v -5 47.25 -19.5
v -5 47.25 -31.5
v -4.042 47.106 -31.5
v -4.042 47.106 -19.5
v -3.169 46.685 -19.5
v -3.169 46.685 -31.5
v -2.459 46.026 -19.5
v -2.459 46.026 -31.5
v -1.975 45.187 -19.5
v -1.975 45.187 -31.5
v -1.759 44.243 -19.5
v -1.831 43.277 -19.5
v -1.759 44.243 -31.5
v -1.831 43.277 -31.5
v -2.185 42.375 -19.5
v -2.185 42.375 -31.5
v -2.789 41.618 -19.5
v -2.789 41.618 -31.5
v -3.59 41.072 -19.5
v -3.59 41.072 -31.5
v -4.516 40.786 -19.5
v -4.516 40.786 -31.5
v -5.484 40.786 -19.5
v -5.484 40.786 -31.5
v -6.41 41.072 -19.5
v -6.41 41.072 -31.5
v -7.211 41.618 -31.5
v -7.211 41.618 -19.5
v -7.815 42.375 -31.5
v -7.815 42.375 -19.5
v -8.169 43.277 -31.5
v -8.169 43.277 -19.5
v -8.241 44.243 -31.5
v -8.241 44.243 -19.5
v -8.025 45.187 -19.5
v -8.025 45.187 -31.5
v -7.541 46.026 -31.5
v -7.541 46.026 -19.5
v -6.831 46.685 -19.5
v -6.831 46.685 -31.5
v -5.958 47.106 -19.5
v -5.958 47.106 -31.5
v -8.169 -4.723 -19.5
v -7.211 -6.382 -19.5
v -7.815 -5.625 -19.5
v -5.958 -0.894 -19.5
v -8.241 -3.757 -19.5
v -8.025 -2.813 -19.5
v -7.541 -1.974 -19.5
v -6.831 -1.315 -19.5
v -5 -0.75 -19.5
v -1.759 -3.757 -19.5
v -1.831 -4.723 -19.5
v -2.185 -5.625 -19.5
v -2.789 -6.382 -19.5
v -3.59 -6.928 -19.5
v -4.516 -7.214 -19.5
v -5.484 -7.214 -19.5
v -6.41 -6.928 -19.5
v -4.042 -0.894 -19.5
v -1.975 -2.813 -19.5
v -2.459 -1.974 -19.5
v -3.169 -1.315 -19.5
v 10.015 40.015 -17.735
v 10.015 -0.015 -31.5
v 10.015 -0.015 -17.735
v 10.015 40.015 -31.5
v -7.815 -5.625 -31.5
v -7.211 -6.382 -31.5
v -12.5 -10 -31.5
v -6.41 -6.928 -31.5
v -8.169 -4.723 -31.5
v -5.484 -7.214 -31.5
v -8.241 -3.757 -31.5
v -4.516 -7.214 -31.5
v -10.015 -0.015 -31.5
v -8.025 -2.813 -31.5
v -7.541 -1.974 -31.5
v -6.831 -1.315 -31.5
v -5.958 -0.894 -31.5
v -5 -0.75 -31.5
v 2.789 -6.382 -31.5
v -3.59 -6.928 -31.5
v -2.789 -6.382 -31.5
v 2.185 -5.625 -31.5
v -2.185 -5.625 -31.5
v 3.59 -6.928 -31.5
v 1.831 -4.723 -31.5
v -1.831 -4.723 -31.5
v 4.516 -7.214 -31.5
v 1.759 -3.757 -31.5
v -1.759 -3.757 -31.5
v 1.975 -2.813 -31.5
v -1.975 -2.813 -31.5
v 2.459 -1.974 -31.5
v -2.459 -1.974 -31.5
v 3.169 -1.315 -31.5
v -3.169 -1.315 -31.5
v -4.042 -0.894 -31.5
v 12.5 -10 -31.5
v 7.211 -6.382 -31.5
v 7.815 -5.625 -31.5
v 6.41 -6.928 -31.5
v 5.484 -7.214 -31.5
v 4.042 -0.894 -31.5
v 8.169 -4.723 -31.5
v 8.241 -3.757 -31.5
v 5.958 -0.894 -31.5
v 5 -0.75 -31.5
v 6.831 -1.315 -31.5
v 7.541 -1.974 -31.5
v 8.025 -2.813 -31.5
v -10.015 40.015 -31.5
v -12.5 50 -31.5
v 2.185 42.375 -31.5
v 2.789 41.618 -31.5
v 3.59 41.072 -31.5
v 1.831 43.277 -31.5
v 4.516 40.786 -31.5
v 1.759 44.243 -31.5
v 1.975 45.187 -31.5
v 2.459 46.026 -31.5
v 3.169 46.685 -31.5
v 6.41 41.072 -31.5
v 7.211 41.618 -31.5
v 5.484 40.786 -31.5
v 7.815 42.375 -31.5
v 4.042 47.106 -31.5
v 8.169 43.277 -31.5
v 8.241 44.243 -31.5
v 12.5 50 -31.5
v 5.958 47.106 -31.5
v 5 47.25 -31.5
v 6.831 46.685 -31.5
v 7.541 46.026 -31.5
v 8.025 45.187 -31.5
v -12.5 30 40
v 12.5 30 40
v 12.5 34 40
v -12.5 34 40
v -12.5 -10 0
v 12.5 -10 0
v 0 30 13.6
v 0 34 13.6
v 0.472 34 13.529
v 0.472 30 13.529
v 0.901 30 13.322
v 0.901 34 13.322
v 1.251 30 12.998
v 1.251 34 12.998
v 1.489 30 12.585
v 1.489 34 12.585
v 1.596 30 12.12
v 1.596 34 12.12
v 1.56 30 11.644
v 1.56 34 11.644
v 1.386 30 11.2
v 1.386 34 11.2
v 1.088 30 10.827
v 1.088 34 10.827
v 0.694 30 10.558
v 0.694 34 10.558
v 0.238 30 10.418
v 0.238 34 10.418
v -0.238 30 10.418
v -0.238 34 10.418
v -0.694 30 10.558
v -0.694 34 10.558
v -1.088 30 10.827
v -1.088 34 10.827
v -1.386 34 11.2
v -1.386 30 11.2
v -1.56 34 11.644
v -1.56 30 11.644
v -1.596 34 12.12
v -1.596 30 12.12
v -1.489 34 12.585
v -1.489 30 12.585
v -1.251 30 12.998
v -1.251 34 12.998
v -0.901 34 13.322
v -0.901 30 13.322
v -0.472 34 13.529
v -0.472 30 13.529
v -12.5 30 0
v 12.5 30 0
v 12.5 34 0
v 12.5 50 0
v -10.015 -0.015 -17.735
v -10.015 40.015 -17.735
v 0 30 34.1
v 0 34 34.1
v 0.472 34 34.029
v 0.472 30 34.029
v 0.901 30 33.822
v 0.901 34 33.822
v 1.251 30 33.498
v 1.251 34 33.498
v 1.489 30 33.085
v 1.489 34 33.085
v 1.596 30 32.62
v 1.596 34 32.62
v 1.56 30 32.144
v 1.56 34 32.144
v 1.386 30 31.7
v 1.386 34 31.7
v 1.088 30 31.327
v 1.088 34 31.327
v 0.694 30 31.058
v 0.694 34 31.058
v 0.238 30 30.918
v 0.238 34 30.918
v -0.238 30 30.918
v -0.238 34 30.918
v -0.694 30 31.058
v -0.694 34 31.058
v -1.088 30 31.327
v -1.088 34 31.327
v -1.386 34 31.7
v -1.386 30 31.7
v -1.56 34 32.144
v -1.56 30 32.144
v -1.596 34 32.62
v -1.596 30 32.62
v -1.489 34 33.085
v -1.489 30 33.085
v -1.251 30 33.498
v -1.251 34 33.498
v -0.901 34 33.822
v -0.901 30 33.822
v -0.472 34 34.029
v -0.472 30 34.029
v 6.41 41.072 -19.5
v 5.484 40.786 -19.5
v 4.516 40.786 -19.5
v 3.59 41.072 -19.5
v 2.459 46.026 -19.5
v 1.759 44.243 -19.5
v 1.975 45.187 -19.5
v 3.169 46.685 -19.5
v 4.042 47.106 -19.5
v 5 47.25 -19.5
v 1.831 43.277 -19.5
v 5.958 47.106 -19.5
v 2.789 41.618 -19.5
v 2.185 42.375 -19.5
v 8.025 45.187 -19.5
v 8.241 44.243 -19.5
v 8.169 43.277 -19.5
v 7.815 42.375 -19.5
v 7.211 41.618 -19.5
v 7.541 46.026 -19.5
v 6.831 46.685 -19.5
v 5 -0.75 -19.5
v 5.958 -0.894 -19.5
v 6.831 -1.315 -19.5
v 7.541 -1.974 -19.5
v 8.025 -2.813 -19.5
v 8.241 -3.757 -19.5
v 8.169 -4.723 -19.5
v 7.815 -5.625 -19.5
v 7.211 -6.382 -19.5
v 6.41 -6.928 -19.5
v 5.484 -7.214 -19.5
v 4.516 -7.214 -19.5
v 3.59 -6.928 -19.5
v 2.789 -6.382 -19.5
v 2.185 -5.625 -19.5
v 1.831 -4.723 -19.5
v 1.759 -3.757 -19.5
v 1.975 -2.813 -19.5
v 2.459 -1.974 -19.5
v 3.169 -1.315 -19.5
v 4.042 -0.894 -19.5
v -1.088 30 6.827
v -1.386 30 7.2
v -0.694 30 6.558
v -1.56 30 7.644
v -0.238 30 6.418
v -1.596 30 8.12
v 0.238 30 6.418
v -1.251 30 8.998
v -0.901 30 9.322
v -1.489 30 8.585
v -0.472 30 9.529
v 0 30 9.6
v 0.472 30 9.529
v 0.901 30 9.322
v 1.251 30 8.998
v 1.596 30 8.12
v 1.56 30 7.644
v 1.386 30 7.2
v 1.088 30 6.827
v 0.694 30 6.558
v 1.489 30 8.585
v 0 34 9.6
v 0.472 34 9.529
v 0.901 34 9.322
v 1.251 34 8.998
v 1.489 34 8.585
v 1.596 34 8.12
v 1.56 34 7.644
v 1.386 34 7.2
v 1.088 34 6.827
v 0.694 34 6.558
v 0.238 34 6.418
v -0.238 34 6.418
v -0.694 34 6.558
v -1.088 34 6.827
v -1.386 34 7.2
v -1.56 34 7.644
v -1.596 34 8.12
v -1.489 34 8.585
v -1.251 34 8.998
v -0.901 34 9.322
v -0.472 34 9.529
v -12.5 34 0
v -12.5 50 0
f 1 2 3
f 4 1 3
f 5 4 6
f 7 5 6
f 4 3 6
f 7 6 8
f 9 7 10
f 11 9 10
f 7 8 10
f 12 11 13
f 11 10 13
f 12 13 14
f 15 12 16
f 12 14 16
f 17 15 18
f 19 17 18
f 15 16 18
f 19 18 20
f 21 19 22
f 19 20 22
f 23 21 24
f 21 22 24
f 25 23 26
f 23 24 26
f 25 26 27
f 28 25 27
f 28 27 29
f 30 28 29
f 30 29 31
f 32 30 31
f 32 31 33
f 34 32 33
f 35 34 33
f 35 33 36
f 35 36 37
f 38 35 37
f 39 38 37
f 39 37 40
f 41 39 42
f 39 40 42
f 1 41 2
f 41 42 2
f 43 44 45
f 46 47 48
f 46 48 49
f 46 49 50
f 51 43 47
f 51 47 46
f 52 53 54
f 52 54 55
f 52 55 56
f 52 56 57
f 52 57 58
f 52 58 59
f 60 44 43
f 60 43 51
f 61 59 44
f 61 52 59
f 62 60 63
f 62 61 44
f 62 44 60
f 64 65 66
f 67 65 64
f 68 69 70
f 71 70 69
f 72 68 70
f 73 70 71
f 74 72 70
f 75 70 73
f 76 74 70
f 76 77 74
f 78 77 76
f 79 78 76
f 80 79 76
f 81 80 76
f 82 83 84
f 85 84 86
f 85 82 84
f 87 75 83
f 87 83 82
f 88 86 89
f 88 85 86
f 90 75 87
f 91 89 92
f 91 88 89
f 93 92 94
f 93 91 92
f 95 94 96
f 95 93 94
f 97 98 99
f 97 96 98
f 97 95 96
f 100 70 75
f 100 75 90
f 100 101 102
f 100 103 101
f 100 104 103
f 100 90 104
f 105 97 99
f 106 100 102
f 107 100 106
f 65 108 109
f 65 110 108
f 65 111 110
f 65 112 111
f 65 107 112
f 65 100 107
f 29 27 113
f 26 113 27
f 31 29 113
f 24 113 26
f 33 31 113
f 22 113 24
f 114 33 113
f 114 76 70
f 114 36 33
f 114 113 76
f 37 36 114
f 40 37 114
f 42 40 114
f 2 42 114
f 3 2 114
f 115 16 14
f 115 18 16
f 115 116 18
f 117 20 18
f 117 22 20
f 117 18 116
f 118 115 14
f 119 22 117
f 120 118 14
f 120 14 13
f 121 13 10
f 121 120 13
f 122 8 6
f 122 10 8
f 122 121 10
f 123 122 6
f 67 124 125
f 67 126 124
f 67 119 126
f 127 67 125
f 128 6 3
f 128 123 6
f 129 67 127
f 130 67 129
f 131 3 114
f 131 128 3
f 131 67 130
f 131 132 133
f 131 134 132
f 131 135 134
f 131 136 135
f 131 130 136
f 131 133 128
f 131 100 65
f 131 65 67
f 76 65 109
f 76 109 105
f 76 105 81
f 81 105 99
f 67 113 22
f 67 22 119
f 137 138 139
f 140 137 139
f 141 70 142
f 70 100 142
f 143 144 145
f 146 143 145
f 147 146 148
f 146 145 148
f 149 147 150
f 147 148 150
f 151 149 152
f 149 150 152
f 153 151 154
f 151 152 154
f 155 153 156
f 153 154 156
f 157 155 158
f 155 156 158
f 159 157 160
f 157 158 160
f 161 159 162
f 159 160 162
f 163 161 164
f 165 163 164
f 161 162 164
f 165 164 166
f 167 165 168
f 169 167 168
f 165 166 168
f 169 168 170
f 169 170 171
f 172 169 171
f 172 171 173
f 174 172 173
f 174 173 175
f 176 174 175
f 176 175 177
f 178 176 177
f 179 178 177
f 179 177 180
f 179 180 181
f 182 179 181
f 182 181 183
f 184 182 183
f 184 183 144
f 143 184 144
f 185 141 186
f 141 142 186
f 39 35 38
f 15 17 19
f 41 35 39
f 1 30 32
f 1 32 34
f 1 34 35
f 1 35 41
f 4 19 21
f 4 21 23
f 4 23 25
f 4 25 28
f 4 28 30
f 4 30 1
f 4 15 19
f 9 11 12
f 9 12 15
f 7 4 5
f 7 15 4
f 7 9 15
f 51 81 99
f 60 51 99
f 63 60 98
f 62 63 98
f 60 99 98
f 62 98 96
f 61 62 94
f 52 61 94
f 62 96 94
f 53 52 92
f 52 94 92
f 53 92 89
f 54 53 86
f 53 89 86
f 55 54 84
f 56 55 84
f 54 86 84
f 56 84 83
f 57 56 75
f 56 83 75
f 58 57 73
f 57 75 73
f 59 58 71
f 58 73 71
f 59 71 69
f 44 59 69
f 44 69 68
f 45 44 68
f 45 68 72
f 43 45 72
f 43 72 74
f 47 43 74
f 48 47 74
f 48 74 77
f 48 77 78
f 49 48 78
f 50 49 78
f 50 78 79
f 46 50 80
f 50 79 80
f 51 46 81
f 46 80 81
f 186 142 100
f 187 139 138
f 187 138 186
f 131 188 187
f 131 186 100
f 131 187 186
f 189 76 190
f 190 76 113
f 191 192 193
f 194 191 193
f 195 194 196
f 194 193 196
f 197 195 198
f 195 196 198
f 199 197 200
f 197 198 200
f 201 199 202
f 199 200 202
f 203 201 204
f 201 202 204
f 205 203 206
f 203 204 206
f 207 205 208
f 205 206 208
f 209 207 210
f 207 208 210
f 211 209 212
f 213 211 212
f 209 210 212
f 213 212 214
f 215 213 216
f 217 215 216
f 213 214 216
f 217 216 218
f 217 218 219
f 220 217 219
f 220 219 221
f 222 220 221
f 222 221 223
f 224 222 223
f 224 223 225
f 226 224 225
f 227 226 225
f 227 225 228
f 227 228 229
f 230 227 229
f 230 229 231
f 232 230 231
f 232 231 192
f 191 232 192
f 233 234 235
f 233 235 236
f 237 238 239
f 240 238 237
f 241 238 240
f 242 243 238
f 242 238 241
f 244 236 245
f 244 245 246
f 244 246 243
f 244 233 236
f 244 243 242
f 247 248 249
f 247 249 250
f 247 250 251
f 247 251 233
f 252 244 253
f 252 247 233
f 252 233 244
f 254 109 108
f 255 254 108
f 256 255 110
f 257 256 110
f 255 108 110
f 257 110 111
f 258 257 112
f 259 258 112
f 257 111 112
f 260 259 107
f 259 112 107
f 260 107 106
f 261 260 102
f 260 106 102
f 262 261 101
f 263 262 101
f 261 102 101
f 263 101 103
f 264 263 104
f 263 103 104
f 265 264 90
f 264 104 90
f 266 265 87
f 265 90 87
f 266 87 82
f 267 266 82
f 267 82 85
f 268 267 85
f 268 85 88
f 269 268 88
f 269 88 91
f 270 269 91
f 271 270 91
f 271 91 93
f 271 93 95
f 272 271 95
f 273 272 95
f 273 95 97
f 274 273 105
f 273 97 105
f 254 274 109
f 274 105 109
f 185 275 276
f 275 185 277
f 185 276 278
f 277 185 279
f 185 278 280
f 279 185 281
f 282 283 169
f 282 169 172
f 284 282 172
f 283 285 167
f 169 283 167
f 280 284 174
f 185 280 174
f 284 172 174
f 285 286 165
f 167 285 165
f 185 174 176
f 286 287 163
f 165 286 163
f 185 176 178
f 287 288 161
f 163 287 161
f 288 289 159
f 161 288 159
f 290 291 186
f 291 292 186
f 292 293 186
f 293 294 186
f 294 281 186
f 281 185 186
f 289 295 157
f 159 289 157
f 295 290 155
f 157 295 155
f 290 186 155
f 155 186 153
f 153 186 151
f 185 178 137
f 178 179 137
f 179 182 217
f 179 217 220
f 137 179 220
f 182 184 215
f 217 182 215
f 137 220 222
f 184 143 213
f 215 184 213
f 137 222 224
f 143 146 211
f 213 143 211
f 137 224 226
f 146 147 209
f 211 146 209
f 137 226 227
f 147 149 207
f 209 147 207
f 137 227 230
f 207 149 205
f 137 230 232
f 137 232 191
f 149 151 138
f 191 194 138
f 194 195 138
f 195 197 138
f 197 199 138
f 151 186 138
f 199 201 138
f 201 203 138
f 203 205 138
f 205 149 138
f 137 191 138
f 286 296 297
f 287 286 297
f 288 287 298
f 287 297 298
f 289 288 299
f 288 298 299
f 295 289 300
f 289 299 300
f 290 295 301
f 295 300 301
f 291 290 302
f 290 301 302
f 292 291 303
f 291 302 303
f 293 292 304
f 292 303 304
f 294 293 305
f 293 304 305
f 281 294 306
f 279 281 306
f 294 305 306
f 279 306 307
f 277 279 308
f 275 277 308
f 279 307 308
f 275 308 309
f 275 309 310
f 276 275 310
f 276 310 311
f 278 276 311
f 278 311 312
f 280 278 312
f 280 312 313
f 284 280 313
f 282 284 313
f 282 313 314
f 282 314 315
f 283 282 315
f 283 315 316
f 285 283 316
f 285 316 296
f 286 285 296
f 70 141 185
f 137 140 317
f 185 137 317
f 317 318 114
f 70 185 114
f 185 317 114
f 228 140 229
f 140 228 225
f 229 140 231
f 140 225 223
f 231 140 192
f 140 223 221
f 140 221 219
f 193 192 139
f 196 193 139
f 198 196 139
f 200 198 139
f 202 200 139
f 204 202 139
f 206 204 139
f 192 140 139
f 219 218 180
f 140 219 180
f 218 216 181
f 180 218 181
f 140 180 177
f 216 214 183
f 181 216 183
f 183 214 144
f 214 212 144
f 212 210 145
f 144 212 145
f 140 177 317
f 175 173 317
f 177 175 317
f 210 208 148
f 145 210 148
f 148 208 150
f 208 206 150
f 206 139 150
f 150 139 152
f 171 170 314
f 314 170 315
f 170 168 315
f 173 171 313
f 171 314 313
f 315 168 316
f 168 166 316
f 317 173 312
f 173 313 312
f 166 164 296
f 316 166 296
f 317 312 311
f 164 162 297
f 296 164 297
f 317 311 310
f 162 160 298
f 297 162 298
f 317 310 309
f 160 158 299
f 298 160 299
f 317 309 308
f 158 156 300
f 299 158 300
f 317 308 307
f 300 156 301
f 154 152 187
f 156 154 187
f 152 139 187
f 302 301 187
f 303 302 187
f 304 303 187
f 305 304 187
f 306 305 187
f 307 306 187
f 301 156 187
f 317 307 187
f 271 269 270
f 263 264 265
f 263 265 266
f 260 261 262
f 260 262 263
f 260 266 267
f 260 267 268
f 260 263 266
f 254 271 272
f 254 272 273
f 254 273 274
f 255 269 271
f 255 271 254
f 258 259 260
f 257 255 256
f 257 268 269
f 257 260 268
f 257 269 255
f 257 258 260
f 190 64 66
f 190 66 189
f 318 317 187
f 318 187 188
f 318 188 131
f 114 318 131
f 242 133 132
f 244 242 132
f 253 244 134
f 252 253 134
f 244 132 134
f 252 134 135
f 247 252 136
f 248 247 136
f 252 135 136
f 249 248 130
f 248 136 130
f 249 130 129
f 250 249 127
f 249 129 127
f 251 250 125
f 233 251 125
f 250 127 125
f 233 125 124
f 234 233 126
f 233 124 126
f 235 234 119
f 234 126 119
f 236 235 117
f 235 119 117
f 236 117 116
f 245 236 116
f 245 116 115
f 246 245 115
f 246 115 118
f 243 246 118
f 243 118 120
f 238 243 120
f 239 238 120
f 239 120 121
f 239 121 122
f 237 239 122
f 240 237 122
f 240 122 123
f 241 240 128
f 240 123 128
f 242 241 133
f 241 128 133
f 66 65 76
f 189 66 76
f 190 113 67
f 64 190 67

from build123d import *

# Parameters (mm, degrees)
SKETCH1_W           = 27.5
SKETCH1_H           = 40
BOSS_EXTRUDE1_DEPTH = 12.5
SKETCH2_W           = 5.015
SKETCH2_H           = 40.03
SKETCH2_W_2         = 10
CUT_EXTRUDE1_DEPTH  = 13.765
SKETCH6_R           = 3.25
CUT_EXTRUDE2_DEPTH  = 12
SKETCH7_R           = 1.6
CUT_EXTRUDE3_DEPTH  = 61.763887302


with BuildPart() as part:
    # Sketch1 → Boss-Extrude1 (new, symmetric)
    with BuildSketch(Plane(origin=(0, 0, 0), x_dir=(0, 0, -1), z_dir=(1, 0, 0))):
        with Locations((17.75, 20)):
            Rectangle(SKETCH1_W, SKETCH1_H)
        Polygon((0, -10), (0, 30), (-40, 30), (-40, 34), (0, 34), (0, 50), (31.5, 50), (31.5, 40), (4, 40), (4, 0), (31.5, 0), (31.5, -10), align=None)
    extrude(amount=BOSS_EXTRUDE1_DEPTH, both=True)

    # Sketch2 → Cut-Extrude1 (cut, symmetric)
    with BuildSketch(Plane(origin=(0, 0, -31.5), x_dir=(-1, 0, 0), z_dir=(0, 0, -1))):
        with Locations((7.5075, 20)):
            Rectangle(SKETCH2_W, SKETCH2_H)
        with Locations((0, 20)):
            Rectangle(SKETCH2_W_2, SKETCH2_H)
        with Locations((-7.5075, 20)):
            Rectangle(SKETCH2_W, SKETCH2_H)
    extrude(amount=CUT_EXTRUDE1_DEPTH, both=True, mode=Mode.SUBTRACT)

    # Sketch6 → Cut-Extrude2 (cut)
    with BuildSketch(Plane(origin=(0, 0, -31.5), x_dir=(-1, 0, 0), z_dir=(0, 0, -1))):
        with Locations(Location((-5, 44, 0), (0, 0, 90))):
            Circle(SKETCH6_R)
        with Locations(Location((5, 44, 0), (0, 0, 90))):
            Circle(SKETCH6_R)
        with Locations(Location((5, -4, 0), (0, 0, 90))):
            Circle(SKETCH6_R)
        with Locations(Location((-5, -4, 0), (0, 0, 90))):
            Circle(SKETCH6_R)
    extrude(amount=-CUT_EXTRUDE2_DEPTH, mode=Mode.SUBTRACT)

    # Sketch7 → Cut-Extrude3 (cut, through all)
    with BuildSketch(Plane(origin=(0, 34, 0), x_dir=(1, 0, 0), z_dir=(0, 1, 0))):
        with Locations(Location((0, -32.5, 0), (0, 0, 270))):
            Circle(SKETCH7_R)
        with Locations(Location((0, -12, 0), (0, 0, 270))):
            Circle(SKETCH7_R)
        with Locations(Location((0, -8, 0), (0, 0, 270))):
            Circle(SKETCH7_R)
    extrude(amount=-CUT_EXTRUDE3_DEPTH, mode=Mode.SUBTRACT)


solid = part.part
